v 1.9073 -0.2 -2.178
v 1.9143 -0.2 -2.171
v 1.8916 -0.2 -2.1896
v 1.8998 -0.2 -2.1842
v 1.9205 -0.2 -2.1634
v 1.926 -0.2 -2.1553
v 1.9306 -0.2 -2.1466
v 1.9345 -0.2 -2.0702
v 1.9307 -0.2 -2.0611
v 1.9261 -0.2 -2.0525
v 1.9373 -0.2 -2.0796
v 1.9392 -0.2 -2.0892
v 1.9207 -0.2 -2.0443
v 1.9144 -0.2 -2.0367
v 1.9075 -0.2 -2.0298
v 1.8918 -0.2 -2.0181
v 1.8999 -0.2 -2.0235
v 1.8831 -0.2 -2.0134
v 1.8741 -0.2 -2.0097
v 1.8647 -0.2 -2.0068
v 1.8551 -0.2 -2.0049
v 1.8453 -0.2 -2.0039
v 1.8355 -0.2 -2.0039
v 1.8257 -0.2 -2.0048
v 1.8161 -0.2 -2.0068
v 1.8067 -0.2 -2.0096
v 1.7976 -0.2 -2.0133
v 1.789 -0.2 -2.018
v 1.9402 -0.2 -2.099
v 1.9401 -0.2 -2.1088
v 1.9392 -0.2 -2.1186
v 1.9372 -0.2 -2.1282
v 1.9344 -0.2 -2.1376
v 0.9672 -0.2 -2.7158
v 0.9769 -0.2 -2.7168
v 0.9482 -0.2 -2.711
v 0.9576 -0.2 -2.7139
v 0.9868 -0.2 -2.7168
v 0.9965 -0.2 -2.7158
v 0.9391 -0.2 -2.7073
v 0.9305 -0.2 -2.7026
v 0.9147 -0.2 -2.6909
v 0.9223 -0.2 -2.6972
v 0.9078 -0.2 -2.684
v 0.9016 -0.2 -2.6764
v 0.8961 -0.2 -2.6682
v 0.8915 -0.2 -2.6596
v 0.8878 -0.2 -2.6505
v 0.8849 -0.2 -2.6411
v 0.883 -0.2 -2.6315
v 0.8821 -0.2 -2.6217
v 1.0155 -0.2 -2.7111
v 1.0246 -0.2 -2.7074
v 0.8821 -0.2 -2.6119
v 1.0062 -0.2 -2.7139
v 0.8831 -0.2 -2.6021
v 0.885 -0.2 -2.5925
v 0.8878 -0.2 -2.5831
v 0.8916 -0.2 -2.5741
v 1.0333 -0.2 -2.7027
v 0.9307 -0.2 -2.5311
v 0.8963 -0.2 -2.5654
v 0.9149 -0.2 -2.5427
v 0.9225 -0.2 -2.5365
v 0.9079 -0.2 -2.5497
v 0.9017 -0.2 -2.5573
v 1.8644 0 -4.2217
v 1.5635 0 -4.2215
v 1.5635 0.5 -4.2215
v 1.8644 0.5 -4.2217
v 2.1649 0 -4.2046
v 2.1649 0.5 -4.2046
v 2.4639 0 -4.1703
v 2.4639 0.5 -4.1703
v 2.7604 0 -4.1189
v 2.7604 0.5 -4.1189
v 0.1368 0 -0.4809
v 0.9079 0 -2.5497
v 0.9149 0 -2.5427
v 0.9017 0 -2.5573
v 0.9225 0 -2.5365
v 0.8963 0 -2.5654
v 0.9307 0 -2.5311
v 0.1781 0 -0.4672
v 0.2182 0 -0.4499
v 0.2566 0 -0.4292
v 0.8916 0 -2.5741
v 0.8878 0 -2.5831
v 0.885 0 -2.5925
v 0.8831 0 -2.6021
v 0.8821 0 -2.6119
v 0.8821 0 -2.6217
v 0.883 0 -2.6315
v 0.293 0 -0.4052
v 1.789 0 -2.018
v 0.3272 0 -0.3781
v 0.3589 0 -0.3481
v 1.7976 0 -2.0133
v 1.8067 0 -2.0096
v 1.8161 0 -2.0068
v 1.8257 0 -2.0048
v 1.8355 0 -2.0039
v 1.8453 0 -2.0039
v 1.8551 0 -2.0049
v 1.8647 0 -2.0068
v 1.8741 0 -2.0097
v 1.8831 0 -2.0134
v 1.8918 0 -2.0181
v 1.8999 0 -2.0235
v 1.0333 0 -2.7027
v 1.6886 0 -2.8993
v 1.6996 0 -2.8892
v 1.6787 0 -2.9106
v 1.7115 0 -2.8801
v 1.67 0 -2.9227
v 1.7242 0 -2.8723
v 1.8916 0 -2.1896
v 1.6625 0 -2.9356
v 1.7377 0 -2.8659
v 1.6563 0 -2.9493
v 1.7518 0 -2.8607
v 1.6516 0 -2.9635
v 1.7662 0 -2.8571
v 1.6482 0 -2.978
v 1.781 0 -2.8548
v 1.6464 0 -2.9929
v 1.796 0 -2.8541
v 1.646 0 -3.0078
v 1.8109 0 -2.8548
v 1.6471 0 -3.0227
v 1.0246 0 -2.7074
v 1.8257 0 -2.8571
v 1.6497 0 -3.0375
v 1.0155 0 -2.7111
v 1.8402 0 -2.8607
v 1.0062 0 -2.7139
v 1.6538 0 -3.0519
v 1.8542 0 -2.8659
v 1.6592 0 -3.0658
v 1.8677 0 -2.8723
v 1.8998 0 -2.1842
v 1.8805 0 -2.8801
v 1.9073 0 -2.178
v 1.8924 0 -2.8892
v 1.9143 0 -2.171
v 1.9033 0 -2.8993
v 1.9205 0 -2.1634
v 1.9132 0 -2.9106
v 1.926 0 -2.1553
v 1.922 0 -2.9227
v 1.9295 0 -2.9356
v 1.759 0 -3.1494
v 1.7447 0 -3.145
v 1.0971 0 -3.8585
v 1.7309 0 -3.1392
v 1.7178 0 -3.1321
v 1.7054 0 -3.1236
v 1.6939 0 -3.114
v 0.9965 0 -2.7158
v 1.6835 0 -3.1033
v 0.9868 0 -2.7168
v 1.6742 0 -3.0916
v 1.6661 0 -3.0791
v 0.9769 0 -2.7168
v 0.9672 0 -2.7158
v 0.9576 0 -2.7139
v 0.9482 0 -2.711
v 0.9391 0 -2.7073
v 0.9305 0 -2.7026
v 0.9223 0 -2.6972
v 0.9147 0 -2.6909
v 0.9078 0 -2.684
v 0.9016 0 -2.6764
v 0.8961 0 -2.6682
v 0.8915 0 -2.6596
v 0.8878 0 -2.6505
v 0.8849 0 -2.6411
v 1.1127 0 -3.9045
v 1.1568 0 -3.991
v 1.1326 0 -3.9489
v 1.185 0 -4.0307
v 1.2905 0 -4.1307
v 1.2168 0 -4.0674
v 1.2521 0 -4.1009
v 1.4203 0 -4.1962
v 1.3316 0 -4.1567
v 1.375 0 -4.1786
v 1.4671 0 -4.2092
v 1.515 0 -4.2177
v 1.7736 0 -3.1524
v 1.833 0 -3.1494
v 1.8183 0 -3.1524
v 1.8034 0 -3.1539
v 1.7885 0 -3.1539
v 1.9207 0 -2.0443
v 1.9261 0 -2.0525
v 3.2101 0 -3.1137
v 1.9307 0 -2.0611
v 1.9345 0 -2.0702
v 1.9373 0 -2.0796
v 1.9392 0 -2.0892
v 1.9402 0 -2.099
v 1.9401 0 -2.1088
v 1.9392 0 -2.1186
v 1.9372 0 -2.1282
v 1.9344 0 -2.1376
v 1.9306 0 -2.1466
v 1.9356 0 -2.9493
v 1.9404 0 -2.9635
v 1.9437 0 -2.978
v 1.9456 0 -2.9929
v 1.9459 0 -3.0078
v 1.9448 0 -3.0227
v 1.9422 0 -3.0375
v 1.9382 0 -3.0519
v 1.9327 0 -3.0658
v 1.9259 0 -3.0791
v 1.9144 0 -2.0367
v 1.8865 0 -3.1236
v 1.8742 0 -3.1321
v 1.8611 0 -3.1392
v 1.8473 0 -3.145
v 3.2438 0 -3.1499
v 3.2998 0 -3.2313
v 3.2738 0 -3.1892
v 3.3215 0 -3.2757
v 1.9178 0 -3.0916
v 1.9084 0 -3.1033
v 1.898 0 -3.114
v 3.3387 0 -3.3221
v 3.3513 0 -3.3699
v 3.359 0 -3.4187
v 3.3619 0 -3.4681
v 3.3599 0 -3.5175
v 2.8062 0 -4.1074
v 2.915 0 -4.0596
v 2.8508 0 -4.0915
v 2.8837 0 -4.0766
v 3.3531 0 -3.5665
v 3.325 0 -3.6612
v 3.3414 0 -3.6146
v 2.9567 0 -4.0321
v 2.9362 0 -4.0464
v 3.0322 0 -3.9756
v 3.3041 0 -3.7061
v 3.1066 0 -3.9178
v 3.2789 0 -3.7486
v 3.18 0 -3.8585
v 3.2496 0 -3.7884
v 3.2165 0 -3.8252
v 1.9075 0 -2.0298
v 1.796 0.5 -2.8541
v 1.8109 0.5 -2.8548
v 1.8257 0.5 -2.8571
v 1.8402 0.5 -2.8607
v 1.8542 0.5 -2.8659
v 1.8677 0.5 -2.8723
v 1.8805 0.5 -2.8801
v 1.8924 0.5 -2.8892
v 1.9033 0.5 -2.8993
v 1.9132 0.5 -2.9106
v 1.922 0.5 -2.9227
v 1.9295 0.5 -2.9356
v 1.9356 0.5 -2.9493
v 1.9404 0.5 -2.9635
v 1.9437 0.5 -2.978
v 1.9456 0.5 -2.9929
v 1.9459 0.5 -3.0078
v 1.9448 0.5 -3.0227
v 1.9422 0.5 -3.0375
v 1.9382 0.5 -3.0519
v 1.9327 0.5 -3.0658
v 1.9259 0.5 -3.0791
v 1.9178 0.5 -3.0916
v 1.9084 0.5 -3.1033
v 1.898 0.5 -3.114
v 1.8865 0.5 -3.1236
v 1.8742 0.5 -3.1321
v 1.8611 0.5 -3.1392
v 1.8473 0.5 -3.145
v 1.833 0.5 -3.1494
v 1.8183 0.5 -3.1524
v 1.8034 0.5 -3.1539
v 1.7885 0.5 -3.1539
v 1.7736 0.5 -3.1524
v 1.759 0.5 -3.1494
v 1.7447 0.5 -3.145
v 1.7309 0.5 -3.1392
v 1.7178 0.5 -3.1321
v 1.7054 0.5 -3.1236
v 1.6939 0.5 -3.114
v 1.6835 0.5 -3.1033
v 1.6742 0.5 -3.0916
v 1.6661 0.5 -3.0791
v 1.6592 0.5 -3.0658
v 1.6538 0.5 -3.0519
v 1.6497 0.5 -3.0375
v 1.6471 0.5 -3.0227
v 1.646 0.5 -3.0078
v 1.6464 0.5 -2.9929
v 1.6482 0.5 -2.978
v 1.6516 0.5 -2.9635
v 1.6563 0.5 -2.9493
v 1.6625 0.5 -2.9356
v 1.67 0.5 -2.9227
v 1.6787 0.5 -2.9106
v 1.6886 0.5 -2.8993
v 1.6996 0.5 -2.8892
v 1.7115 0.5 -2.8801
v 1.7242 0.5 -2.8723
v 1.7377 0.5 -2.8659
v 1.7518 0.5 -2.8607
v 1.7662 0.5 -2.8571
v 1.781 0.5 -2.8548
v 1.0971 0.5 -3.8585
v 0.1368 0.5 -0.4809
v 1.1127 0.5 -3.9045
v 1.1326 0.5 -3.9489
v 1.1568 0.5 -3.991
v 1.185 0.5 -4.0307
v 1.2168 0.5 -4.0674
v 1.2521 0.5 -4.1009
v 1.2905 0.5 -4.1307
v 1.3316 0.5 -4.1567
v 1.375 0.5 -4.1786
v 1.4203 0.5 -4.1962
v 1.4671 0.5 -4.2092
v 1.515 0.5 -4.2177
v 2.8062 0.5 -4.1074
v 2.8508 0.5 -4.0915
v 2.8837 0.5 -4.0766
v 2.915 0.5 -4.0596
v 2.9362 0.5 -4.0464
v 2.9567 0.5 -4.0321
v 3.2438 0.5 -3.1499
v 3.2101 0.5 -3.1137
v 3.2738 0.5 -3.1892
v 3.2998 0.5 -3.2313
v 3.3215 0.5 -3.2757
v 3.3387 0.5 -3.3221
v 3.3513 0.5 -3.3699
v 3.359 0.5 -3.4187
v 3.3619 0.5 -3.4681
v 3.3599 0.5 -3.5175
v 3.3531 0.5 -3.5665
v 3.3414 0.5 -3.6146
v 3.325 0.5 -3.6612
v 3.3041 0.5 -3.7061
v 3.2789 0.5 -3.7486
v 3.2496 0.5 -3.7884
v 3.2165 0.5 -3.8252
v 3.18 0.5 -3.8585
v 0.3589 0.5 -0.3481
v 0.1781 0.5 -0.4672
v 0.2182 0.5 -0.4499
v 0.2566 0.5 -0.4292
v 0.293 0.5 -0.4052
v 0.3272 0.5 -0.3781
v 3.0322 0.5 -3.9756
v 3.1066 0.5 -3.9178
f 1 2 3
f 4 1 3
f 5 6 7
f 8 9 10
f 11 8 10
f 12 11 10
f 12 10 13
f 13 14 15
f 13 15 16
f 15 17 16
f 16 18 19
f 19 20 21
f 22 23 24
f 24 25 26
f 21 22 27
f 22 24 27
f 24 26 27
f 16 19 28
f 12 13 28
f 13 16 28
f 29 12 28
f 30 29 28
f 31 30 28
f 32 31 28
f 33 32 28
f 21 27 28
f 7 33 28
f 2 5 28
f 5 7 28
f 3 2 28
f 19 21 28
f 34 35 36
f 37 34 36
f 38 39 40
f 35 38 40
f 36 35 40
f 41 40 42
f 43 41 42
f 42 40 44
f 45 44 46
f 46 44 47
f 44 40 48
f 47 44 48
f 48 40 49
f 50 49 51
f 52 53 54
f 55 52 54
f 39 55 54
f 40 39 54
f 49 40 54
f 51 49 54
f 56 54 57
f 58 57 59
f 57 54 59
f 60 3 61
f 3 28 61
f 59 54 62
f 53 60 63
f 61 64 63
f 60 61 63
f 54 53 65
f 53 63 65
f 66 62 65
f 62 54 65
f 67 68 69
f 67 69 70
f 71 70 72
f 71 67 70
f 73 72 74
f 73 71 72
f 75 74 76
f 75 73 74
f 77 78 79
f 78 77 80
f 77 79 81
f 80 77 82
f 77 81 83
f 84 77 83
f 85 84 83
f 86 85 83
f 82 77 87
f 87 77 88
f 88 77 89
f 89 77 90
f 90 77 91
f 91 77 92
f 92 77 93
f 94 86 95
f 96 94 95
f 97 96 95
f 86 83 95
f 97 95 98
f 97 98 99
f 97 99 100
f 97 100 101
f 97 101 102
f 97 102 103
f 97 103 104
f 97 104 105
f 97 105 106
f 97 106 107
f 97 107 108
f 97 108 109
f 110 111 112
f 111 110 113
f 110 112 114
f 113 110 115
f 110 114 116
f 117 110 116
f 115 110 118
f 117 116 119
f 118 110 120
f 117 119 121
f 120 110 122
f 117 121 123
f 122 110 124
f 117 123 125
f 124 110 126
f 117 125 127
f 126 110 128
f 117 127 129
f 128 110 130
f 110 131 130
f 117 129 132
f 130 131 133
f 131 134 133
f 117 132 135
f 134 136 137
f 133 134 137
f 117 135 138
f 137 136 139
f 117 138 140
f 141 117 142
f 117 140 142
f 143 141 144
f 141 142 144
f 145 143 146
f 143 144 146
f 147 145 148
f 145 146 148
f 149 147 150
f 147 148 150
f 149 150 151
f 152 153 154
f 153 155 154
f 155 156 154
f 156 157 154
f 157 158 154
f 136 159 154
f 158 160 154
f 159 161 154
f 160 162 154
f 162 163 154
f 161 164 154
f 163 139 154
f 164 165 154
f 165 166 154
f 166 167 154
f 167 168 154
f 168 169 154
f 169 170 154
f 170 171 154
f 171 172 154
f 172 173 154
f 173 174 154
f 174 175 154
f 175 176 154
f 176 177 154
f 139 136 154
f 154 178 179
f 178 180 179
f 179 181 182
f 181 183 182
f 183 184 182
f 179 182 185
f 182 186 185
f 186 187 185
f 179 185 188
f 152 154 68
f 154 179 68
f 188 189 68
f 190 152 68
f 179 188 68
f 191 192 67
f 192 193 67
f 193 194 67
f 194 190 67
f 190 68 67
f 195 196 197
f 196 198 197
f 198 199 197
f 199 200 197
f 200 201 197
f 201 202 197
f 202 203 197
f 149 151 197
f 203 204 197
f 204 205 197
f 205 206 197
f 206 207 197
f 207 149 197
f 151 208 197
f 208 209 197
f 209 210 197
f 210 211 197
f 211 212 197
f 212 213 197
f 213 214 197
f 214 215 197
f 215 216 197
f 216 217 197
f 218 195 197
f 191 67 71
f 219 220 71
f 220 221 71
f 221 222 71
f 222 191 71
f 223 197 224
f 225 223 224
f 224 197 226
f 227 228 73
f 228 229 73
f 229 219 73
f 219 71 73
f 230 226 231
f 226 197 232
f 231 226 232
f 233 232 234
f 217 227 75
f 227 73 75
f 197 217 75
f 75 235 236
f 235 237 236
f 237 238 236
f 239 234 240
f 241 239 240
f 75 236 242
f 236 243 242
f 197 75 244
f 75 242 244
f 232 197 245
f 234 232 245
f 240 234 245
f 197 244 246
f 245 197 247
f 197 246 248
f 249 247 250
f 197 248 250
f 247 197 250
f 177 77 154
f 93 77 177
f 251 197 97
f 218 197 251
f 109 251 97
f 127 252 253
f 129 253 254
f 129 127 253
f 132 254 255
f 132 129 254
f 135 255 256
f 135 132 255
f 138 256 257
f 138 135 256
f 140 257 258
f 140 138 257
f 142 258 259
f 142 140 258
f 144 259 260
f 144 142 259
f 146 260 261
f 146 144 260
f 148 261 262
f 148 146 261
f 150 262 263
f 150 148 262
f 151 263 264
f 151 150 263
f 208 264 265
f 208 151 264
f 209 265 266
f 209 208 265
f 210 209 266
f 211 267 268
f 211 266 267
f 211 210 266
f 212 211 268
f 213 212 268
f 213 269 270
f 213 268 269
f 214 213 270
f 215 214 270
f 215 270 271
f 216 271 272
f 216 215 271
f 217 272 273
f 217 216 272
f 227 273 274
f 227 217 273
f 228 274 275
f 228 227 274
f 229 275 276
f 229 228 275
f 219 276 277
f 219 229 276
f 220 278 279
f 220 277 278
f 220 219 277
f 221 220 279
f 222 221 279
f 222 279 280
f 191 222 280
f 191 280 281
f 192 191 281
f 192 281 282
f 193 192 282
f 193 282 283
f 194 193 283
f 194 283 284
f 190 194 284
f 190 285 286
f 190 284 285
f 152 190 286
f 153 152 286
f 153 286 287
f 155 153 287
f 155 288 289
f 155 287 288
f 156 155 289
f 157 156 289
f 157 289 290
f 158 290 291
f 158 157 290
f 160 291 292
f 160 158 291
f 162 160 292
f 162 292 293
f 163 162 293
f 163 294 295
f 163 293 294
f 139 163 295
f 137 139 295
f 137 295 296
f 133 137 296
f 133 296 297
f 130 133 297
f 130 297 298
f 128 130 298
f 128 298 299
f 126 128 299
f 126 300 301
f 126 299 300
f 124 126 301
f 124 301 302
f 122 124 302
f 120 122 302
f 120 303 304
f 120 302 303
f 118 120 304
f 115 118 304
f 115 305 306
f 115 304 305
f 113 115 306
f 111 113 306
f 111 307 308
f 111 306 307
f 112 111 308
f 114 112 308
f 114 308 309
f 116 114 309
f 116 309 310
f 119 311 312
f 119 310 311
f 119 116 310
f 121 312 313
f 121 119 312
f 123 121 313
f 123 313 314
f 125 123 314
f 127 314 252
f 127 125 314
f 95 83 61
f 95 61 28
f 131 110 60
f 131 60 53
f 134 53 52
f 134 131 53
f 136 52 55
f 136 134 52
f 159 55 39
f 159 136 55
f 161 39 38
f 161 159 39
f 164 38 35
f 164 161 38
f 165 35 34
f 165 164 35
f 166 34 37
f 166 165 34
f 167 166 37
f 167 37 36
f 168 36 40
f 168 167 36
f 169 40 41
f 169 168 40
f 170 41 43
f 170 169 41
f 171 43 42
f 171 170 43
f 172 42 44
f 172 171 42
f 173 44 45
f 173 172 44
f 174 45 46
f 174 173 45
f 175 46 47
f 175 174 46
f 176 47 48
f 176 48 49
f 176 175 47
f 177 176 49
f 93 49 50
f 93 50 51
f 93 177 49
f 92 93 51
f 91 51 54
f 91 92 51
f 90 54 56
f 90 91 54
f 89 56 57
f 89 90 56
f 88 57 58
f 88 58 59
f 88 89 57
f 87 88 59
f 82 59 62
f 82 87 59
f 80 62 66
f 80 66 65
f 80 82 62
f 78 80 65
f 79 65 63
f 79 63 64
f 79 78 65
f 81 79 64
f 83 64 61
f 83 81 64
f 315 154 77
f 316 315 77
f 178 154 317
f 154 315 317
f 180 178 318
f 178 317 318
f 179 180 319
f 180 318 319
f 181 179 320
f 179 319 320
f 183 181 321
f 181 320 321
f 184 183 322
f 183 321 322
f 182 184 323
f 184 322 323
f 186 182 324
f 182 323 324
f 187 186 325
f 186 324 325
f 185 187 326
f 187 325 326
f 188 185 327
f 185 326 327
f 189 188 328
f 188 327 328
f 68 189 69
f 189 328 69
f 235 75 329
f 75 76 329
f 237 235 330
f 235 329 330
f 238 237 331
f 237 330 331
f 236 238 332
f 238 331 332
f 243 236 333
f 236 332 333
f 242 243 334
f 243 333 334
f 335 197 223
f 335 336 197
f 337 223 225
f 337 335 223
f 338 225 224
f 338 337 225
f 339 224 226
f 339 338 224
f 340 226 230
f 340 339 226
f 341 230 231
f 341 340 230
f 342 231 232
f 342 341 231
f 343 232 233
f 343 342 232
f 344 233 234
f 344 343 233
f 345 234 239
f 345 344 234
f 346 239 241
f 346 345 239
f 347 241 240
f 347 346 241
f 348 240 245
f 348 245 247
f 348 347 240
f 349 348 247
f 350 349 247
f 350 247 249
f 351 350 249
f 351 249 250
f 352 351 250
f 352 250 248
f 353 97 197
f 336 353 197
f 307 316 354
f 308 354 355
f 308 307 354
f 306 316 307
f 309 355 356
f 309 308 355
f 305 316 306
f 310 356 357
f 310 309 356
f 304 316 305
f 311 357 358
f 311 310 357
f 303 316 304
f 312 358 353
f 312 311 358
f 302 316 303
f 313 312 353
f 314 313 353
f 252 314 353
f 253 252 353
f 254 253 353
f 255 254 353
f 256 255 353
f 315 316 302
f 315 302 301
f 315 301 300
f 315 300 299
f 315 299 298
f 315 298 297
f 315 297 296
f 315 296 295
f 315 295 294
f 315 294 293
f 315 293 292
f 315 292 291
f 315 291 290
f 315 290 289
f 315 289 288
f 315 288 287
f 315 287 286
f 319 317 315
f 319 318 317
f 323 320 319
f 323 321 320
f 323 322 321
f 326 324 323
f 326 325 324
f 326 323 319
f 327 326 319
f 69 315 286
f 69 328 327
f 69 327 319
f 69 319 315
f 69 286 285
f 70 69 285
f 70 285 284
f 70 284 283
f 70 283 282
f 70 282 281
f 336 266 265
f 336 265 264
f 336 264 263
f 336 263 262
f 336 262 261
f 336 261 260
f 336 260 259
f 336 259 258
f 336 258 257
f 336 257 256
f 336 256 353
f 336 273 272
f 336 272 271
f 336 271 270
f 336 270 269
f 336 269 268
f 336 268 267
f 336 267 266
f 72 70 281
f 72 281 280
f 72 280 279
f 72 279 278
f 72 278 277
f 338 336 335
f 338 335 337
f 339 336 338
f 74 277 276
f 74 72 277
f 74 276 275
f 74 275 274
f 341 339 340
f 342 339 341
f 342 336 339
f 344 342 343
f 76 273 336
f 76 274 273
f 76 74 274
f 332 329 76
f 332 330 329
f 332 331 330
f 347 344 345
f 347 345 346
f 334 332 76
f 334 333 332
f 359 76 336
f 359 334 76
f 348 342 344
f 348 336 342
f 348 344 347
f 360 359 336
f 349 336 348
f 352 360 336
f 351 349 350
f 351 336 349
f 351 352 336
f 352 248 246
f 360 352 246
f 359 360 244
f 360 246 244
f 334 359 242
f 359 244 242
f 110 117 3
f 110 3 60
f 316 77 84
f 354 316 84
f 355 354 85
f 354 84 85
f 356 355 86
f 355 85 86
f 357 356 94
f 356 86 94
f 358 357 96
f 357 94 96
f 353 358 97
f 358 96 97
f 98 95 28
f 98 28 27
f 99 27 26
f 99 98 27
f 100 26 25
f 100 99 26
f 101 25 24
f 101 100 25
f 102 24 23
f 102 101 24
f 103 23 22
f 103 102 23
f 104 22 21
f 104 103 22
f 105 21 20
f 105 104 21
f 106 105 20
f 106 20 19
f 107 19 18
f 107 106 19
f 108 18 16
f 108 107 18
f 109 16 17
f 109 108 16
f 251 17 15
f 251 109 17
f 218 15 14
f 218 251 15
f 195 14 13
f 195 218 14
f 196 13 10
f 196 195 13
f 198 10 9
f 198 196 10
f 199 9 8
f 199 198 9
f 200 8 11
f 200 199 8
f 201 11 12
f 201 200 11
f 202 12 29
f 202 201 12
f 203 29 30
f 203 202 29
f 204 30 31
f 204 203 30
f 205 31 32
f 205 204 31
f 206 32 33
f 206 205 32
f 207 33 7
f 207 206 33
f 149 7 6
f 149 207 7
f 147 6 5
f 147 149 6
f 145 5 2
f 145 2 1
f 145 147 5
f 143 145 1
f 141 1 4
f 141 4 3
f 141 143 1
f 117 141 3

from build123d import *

# Parameters (mm, degrees)
BOSS_EXTRUDE1_DEPTH = 0.5
SKETCH2_R           = 0.15
CUT_EXTRUDE1_DEPTH  = 2
CUT_EXTRUDE2_START  = -0.5
CUT_EXTRUDE2_DEPTH  = 0.5
FILLET2_R           = 0.5
BOSS_EXTRUDE2_DEPTH = 0.2


# Read off the part's stored shape, not the designer's step: Cut-Extrude2
with BuildPart() as part:
    # Sketch1 → Boss-Extrude1 (new body)
    with BuildSketch(Plane(origin=(0, 0, 0), x_dir=(1, 0, 0), z_dir=(0, 1, 0))):
        with BuildLine():
            ThreePointArc((0.136751509, 0.480935572), (0.2565671, 0.429154195), (0.358898067, 0.348126669))
            Line((0.358898067, 0.348126669), (3.588980668, 3.48126669))
            ThreePointArc((3.588980668, 3.48126669), (2.565670997, 4.291541953), (1.367515087, 4.809355725))
            Line((1.367515087, 4.809355725), (0.136751509, 0.480935572))
        make_face()
    extrude(amount=BOSS_EXTRUDE1_DEPTH)

    # Sketch2 → Cut-Extrude1 (cut)
    with BuildSketch(Plane(origin=(0, 0, 0), x_dir=(1, 0, 0), z_dir=(0, 1, 0))):
        with Locations(Location((1.795969698, 3.004079367, 0), (0, 0, 270))):
            Circle(SKETCH2_R)
    extrude(amount=CUT_EXTRUDE1_DEPTH, mode=Mode.SUBTRACT)

    # Cut-Extrude2 outline → Cut-Extrude2 (cut)
    with BuildSketch(Plane(origin=(0, 0.5, 0), x_dir=(1, 0, 0), z_dir=(0, 1, 0)).offset(CUT_EXTRUDE2_START)):
        with BuildLine():
            ThreePointArc((1.193568814, 4.197611464), (2.034611336, 4.214092225), (2.867489845, 4.096034911))
            ThreePointArc((2.867489845, 4.096034911), (2.14732935, 4.515415447), (1.367515087, 4.809355725))
            Line((1.367515087, 4.809355725), (1.193568814, 4.197611464))
        make_face()
    extrude(amount=CUT_EXTRUDE2_DEPTH, mode=Mode.SUBTRACT)

    # Fillet2
    fillet2_edges = [part.edges().sort_by_distance(p)[0] for p in [
        (1.193568814, 0.25, -4.197611464),
        (2.867489845, 0.25, -4.096034911),
        (3.588980668, 0.25, -3.48126669),
    ]]
    fillet(fillet2_edges, radius=FILLET2_R)

    # Sketch4 → Boss-Extrude2 (add)
    with BuildSketch(Plane.XZ):
        with BuildLine():
            Line((0.930651433, -2.531084335), (1.788959824, -2.017950136))
            ThreePointArc((1.788959824, -2.017950136), (1.926104083, -2.052467555), (1.891586663, -2.189611814))
            Line((1.891586663, -2.189611814), (1.033278273, -2.702746013))
            ThreePointArc((1.033278273, -2.702746013), (0.896134014, -2.668228594), (0.930651433, -2.531084335))
        make_face()
    extrude(amount=BOSS_EXTRUDE2_DEPTH)


solid = part.part
